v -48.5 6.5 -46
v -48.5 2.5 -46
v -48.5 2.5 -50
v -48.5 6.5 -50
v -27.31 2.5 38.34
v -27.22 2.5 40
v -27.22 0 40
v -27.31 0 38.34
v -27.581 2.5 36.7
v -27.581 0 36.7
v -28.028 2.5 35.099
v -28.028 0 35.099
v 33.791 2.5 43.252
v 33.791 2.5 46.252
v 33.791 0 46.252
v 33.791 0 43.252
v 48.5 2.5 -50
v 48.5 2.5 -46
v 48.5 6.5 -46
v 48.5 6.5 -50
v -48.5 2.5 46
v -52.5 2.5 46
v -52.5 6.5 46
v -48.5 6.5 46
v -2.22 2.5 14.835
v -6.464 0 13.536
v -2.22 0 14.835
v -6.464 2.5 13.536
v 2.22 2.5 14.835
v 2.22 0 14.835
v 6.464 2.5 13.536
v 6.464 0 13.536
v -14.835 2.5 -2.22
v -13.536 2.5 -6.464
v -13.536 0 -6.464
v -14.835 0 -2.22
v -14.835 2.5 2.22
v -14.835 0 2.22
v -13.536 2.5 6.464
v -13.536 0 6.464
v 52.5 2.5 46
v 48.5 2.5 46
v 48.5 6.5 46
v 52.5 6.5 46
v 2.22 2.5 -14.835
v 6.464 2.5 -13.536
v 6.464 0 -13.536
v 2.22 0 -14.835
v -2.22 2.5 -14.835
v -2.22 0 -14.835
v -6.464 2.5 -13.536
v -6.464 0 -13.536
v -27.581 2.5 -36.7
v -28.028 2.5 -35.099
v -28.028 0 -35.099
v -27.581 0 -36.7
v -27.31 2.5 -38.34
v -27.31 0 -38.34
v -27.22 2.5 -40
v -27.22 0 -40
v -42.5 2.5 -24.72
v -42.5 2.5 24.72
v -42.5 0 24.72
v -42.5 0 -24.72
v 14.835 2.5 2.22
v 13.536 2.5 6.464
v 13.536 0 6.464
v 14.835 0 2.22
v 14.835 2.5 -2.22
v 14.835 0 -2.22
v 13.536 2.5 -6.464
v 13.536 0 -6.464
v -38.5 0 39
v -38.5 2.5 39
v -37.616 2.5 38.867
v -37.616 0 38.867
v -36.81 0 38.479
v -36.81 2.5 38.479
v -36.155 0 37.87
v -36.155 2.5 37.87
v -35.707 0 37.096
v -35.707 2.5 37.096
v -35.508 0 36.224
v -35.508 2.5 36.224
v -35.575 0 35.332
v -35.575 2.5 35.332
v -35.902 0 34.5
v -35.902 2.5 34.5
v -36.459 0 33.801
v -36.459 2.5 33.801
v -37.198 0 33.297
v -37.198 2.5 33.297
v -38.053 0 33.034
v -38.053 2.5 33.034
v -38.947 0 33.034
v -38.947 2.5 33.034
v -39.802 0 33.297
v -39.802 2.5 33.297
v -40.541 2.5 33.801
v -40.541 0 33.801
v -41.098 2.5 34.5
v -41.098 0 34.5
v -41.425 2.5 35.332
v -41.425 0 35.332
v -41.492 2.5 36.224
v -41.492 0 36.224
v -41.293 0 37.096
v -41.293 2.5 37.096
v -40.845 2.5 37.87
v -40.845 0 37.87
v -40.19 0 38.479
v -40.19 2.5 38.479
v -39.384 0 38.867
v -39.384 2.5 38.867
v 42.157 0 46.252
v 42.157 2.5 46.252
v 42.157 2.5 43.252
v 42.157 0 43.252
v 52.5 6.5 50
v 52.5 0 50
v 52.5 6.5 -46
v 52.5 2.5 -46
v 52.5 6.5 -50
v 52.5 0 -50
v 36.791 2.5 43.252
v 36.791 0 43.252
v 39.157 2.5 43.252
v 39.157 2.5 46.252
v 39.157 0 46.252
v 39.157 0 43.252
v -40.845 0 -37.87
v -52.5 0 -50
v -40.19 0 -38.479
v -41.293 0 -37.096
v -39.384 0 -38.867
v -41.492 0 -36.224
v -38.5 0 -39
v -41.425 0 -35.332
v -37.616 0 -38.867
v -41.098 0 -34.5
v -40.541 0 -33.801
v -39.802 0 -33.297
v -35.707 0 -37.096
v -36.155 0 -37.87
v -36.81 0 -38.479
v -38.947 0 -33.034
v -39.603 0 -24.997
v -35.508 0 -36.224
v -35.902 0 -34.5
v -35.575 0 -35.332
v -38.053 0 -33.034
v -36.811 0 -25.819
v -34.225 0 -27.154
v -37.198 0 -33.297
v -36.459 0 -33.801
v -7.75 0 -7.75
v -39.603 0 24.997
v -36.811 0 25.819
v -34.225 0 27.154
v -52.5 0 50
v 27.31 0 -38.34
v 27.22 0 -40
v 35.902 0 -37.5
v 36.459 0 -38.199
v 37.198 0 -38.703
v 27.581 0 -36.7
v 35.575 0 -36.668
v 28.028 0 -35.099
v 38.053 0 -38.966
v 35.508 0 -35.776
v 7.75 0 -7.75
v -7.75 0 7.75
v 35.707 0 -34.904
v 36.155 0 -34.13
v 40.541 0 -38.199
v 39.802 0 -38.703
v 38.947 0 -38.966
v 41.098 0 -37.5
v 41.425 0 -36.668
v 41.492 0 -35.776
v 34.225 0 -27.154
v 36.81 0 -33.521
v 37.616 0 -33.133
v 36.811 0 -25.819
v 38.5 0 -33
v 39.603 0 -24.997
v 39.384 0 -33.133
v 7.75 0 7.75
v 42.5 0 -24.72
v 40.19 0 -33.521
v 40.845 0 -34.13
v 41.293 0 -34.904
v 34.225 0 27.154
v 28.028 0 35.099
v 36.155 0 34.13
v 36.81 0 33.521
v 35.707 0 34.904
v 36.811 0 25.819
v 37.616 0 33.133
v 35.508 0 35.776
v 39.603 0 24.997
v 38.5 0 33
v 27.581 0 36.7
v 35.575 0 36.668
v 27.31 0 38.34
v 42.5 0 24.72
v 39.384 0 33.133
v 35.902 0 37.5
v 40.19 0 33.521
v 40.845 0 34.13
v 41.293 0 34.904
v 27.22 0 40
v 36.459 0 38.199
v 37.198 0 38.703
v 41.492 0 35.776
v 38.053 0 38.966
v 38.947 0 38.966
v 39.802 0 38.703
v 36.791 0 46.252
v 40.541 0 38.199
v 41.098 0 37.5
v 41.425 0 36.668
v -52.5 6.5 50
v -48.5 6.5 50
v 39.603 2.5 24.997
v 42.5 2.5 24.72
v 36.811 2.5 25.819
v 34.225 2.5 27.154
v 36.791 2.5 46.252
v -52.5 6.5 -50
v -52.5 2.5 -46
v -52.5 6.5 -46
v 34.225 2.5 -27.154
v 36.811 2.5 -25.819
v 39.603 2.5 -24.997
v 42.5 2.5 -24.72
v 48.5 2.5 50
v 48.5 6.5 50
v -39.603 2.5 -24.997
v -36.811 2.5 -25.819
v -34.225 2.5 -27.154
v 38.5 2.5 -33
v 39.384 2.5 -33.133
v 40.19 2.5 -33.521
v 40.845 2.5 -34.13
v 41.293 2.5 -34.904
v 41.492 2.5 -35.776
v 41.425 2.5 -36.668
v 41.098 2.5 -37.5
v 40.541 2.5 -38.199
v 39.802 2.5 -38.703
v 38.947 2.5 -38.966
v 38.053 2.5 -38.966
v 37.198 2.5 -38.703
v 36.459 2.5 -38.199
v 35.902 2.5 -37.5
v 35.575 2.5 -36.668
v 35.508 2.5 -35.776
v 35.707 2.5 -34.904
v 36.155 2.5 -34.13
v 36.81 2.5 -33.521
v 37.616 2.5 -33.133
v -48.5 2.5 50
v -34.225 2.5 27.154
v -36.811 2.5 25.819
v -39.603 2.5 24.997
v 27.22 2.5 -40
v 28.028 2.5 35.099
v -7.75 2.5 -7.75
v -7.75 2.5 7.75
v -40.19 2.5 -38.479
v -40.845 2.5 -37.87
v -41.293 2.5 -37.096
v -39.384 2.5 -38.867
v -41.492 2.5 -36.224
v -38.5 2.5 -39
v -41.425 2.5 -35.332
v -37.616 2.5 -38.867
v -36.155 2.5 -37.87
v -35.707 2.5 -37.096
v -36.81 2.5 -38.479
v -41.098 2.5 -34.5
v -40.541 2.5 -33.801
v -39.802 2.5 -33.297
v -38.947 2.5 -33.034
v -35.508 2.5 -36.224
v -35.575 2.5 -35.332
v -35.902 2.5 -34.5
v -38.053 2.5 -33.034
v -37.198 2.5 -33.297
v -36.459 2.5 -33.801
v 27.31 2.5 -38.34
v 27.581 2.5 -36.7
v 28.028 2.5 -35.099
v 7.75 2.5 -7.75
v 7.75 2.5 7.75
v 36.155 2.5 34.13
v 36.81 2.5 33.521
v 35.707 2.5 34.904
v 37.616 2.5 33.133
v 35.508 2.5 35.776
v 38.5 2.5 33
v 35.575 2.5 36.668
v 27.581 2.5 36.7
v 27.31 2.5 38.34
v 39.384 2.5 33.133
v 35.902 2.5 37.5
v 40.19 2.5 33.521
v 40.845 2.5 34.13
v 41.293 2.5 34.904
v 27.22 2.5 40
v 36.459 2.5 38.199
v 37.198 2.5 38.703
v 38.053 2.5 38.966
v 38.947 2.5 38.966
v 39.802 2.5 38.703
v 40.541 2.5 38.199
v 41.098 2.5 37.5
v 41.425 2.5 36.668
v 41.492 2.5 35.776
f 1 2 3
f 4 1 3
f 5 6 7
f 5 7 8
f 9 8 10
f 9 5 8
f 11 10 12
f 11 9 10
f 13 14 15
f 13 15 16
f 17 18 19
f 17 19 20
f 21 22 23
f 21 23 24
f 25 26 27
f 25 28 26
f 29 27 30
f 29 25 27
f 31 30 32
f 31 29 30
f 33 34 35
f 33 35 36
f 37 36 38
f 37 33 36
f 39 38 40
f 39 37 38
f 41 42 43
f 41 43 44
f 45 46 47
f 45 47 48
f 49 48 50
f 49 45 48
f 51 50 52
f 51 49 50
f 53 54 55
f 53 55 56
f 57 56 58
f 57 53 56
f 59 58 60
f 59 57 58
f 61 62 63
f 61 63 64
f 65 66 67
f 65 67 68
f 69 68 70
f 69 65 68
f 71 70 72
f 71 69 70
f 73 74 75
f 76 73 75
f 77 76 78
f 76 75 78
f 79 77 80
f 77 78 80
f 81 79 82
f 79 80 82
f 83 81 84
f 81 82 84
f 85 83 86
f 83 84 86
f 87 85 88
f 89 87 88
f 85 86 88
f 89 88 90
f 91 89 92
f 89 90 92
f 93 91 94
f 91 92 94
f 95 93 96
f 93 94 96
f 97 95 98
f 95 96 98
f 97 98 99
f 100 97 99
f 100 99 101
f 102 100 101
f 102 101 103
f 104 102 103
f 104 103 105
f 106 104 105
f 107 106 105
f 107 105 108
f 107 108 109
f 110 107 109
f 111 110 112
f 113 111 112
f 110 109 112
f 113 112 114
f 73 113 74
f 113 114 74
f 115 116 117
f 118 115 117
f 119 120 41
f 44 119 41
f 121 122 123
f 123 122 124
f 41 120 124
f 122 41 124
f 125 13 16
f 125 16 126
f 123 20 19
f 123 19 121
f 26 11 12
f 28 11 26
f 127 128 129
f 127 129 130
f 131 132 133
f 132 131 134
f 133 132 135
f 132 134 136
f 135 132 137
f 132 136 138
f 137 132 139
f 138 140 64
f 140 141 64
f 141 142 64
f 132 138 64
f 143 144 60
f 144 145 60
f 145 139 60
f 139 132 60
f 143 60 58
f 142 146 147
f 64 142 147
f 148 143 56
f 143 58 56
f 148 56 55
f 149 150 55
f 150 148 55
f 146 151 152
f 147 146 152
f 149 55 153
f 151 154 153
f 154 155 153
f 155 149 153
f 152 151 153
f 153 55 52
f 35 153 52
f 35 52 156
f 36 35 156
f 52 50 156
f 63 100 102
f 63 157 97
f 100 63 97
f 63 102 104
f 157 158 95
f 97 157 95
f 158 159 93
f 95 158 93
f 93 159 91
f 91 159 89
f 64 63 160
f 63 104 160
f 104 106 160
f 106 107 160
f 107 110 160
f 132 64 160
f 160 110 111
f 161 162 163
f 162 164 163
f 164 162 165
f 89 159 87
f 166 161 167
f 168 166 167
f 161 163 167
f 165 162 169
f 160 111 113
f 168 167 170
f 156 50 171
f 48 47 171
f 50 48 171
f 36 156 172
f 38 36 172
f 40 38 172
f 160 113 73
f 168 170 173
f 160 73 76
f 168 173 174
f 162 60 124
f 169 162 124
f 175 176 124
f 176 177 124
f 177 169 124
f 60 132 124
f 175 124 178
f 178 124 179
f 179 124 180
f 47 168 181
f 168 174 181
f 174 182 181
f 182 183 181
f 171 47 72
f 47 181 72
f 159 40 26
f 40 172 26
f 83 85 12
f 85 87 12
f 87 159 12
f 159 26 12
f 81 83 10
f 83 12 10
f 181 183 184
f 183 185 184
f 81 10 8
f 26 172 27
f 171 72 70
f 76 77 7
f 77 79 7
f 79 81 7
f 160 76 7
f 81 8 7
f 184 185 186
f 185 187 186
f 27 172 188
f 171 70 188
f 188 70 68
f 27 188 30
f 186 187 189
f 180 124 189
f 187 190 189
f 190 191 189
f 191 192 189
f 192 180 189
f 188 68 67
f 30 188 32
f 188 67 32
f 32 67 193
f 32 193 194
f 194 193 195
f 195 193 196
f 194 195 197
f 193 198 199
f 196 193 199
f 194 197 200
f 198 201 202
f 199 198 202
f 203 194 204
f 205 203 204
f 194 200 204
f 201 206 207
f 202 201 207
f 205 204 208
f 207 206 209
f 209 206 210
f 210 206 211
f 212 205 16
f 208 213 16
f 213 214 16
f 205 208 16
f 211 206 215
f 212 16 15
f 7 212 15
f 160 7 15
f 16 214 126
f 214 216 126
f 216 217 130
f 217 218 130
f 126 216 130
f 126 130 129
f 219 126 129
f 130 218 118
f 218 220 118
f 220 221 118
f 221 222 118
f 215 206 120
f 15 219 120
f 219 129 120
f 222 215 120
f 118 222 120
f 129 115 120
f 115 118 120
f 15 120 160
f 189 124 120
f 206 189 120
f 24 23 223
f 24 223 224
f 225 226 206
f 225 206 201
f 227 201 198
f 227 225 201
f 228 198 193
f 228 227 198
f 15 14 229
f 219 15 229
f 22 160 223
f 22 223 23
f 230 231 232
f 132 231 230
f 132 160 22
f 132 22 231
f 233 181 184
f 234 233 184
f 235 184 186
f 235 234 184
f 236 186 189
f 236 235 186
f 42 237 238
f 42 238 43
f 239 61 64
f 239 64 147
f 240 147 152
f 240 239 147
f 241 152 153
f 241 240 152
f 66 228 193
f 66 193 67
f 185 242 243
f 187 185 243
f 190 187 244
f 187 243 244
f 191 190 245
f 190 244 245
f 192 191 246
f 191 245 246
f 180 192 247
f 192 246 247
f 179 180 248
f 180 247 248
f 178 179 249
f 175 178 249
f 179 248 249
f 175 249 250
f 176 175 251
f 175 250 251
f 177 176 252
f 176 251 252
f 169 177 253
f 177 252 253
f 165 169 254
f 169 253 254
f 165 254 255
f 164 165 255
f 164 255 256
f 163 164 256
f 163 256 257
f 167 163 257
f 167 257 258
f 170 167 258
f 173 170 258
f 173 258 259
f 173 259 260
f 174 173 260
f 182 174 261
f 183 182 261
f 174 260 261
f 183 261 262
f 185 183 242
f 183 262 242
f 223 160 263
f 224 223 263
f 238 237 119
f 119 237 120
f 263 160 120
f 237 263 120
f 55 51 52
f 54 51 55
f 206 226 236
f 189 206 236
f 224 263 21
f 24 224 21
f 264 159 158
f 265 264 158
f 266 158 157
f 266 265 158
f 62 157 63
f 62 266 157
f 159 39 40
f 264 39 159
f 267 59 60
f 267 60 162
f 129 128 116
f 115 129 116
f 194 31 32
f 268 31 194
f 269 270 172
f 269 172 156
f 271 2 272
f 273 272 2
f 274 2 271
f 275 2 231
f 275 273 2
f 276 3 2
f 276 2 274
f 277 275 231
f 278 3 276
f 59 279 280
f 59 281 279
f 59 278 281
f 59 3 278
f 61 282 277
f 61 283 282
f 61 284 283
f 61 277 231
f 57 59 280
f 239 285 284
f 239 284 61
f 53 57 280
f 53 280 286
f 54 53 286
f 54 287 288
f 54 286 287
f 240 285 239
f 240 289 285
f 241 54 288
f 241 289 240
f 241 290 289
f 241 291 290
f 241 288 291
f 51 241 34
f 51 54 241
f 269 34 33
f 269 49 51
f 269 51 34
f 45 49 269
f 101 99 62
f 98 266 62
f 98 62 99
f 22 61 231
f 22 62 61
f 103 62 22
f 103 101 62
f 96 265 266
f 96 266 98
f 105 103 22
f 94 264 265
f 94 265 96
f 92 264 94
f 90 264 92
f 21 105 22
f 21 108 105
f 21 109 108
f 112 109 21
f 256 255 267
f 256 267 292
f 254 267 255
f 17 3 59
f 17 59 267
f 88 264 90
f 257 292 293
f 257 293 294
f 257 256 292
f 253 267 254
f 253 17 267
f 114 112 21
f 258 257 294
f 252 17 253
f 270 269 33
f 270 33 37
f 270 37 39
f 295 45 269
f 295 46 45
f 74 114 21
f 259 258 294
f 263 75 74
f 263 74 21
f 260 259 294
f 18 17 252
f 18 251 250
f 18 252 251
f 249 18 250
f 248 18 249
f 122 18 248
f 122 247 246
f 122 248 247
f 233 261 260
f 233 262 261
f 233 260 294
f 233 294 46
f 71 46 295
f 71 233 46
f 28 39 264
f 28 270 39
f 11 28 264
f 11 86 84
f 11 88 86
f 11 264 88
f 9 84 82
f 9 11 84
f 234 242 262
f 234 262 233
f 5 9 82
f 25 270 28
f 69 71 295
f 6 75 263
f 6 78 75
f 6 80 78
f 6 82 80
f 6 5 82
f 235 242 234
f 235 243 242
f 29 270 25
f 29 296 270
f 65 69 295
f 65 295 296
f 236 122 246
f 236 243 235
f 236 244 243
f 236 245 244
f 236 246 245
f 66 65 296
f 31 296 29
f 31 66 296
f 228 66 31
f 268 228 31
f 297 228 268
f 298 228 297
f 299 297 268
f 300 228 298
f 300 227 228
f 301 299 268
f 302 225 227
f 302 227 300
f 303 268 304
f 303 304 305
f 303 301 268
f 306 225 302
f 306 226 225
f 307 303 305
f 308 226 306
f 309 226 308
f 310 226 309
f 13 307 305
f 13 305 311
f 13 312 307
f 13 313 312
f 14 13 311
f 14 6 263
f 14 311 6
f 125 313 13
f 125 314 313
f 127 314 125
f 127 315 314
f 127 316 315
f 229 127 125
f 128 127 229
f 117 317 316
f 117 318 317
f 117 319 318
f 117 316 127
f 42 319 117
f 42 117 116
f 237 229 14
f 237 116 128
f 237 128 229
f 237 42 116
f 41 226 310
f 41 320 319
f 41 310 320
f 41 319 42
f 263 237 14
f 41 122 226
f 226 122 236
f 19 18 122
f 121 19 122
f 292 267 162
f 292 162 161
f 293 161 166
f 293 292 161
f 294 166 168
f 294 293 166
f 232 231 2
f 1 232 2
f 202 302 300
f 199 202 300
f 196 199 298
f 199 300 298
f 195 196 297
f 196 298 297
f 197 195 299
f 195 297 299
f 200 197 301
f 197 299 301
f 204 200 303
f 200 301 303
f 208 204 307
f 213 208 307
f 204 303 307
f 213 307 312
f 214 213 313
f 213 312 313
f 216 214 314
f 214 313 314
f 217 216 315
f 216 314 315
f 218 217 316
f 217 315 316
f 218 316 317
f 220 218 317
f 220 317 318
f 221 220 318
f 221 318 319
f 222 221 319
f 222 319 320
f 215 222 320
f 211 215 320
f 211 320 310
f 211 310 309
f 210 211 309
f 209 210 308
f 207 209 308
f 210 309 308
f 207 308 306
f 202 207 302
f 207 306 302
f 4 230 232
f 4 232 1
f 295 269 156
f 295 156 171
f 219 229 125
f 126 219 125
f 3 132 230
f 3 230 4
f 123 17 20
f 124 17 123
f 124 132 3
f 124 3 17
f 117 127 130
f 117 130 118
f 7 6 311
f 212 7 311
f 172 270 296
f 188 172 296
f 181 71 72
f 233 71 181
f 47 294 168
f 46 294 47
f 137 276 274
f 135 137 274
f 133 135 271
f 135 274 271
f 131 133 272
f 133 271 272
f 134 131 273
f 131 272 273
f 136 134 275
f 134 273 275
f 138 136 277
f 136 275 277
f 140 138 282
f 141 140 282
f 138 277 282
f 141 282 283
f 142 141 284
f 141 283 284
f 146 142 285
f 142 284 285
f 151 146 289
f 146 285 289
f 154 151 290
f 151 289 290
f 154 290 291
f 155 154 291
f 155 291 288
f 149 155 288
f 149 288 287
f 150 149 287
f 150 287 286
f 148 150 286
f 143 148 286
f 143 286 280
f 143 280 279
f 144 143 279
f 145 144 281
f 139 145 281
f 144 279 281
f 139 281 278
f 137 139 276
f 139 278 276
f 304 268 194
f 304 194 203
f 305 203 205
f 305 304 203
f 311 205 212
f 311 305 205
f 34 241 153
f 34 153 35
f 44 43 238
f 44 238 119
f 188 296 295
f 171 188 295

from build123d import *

# Parameters (mm, degrees)
SKETCH1_W           = 105
SKETCH1_H           = 100
BOSS_EXTRUDE1_DEPTH = 2.5
SKETCH3_W           = 4
SKETCH3_H           = 4
BOSS_EXTRUDE2_DEPTH = 4
SKETCH5_W           = 85
SKETCH5_H           = 80
CUT_EXTRUDE2_DEPTH  = 4
SKETCH6_R           = 15
BOSS_EXTRUDE3_DEPTH = 2.5
SKETCH7_W           = 15.5
SKETCH7_H           = 15.5
CUT_EXTRUDE3_DEPTH  = 2.5
BOSS_EXTRUDE4_DEPTH = 2.5
EXTRUDE_THIN2_DEPTH = 2.5
SKETCH10_R          = 3
CUT_EXTRUDE5_DEPTH  = 2.5
SKETCH11_W          = 3
SKETCH11_H          = 3
CUT_EXTRUDE6_DEPTH  = 2.5


with BuildPart() as part:
    # Sketch1 → Boss-Extrude1 (new body)
    with BuildSketch(Plane(origin=(0, 0, 0), x_dir=(1, 0, 0), z_dir=(0, 1, 0))):
        Rectangle(SKETCH1_W, SKETCH1_H)
    extrude(amount=BOSS_EXTRUDE1_DEPTH)

    # Sketch3 → Boss-Extrude2 (add)
    with BuildSketch(Plane(origin=(0, 2.5, 0), x_dir=(1, 0, 0), z_dir=(0, 1, 0))):
        with Locations((-50.5, 48)):
            Rectangle(SKETCH3_W, SKETCH3_H)
        with Locations((50.5, 48)):
            Rectangle(SKETCH3_W, SKETCH3_H)
        with Locations((50.5, -48)):
            Rectangle(SKETCH3_W, SKETCH3_H)
        with Locations((-50.5, -48)):
            Rectangle(SKETCH3_W, SKETCH3_H)
    extrude(amount=BOSS_EXTRUDE2_DEPTH)

    # Sketch5 → Cut-Extrude2 (cut)
    with BuildSketch(Plane(origin=(0, 2.5, 0), x_dir=(1, 0, 0), z_dir=(0, 1, 0))):
        Rectangle(SKETCH5_W, SKETCH5_H)
    extrude(amount=-CUT_EXTRUDE2_DEPTH, mode=Mode.SUBTRACT)

    # Sketch8 → Boss-Extrude4 (add)
    with BuildSketch(Plane(origin=(0, 2.5, 0), x_dir=(1, 0, 0), z_dir=(0, 1, 0))):
        with BuildLine():
            Line((-42.5, -40), (-27.220069463, -40))
            ThreePointArc((-27.220069463, -40), (-31.695457502, -29.195457502), (-42.5, -24.720069463))
            Line((-42.5, -24.720069463), (-42.5, -40))
        make_face()
        with BuildLine():
            ThreePointArc((-42.5, 24.720069463), (-31.695457502, 29.195457502), (-27.220069463, 40))
            Line((-27.220069463, 40), (-42.5, 40))
            Line((-42.5, 40), (-42.5, 24.720069463))
        make_face()
        with BuildLine():
            Line((42.5, 40), (27.220069463, 40))
            ThreePointArc((27.220069463, 40), (31.695457502, 29.195457502), (42.5, 24.720069463))
            Line((42.5, 24.720069463), (42.5, 40))
        make_face()
        with BuildLine():
            ThreePointArc((42.5, -24.720069463), (31.695457502, -29.195457502), (27.220069463, -40))
            Line((27.220069463, -40), (42.5, -40))
            Line((42.5, -40), (42.5, -24.720069463))
        make_face()
    extrude(amount=-BOSS_EXTRUDE4_DEPTH)



with BuildPart() as body_2:
    # Sketch6 → Boss-Extrude3 (new body)
    with BuildSketch(Plane(origin=(0, 2.5, 0), x_dir=(1, 0, 0), z_dir=(0, 1, 0))):
        with Locations(Location((0, 0, 0), (0, 0, 270))):
            Circle(SKETCH6_R)
    extrude(amount=-BOSS_EXTRUDE3_DEPTH)

    # Sketch7 → Cut-Extrude3 (cut)
    with BuildSketch(Plane(origin=(0, 2.5, 0), x_dir=(1, 0, 0), z_dir=(0, 1, 0))):
        Rectangle(SKETCH7_W, SKETCH7_H)
    extrude(amount=-CUT_EXTRUDE3_DEPTH, mode=Mode.SUBTRACT)


with BuildPart() as part_1:
    add(part.part)

    add(body_2.part)  # Extrude-Thin2 merges body 2
    # Sketch9 → Extrude-Thin2 (add)
    with BuildSketch(Plane(origin=(0, 2.5, 0), x_dir=(1, 0, 0), z_dir=(0, 1, 0))):
        Polygon((4.214466094, -11.285533906), (34.46870341, -41.539771222), (41.539771222, -34.46870341), (11.285533906, -4.214466094), align=None)
        Polygon((-11.285533906, -4.214466094), (-41.539771222, -34.46870341), (-34.46870341, -41.539771222), (-4.214466094, -11.285533906), align=None)
        Polygon((11.285533906, 4.214466094), (41.539771222, 34.46870341), (34.46870341, 41.539771222), (4.214466094, 11.285533906), align=None)
        Polygon((-4.214466094, 11.285533906), (-34.46870341, 41.539771222), (-41.539771222, 34.46870341), (-11.285533906, 4.214466094), align=None)
    extrude(amount=-EXTRUDE_THIN2_DEPTH)

    # Sketch10 → Cut-Extrude5 (cut)
    with BuildSketch(Plane(origin=(0, 2.5, 0), x_dir=(1, 0, 0), z_dir=(0, 1, 0))):
        with Locations(Location((38.5, 36, 0), (0, 0, 270))):
            Circle(SKETCH10_R)
        with Locations(Location((-38.5, 36, 0), (0, 0, 90))):
            Circle(SKETCH10_R)
        with Locations(Location((38.5, -36, 0), (0, 0, 90))):
            Circle(SKETCH10_R)
        with Locations(Location((-38.5, -36, 0), (0, 0, 270))):
            Circle(SKETCH10_R)
    extrude(amount=-CUT_EXTRUDE5_DEPTH, mode=Mode.SUBTRACT)

    # Sketch11 → Cut-Extrude6 (cut)
    with BuildSketch(Plane(origin=(0, 2.5, 0), x_dir=(1, 0, 0), z_dir=(0, 1, 0))):
        with Locations((40.657260224, -44.752137111)):
            Rectangle(SKETCH11_W, SKETCH11_H)
        with Locations((35.291405318, -44.752137111)):
            Rectangle(SKETCH11_W, SKETCH11_H)
    extrude(amount=-CUT_EXTRUDE6_DEPTH, mode=Mode.SUBTRACT)


solid = part_1.part
